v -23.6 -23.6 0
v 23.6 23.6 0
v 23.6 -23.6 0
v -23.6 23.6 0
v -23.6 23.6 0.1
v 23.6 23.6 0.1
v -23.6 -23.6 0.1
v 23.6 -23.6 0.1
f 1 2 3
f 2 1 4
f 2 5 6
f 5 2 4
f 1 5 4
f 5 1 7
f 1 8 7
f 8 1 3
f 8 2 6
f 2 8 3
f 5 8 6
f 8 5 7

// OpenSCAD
// file: ../p/box5-12.scad
use <../lib.scad>
function ldraw_lib__box5_12() = [
// 0 Box with 5 Faces without Any Edges
// 0 Name: box5-12.dat
// 0 Author: Chris Dee [cwdee]
// 0 !LDRAW_ORG Primitive UPDATE 2009-02
// 0 !LICENSE Licensed under CC BY 4.0 : see CAreadme.txt
// 
// 0 BFC CERTIFY CCW
  [0,"BFC","CERTIFY"],
  [0,"BFC","CCW"],
// 
// 0 !HISTORY 2009-09-03 [PTadmin] Official Update 2009-02
// 
// 
// 4 16 1 1 1 1 1 -1 -1 1 -1 -1 1 1
  [4,16,1,1,1,1,1,-1,-1,1,-1,-1,1,1],
// 4 16 -1 0 1 1 0 1 1 1 1 -1 1 1
  [4,16,-1,0,1,1,0,1,1,1,1,-1,1,1],
// 4 16 -1 0 -1 -1 0 1 -1 1 1 -1 1 -1
  [4,16,-1,0,-1,-1,0,1,-1,1,1,-1,1,-1],
// 4 16 1 0 -1 -1 0 -1 -1 1 -1 1 1 -1
  [4,16,1,0,-1,-1,0,-1,-1,1,-1,1,1,-1],
// 4 16 1 0 1 1 0 -1 1 1 -1 1 1 1
  [4,16,1,0,1,1,0,-1,1,1,-1,1,1,1],
// 0
];
module ldraw_lib__box5_12(step=0, col=false, unit=2/5, alt=false, line=0.2, solid=!$preview)
    makepoly(ldraw_lib__box5_12(), step=step, col=col, unit=unit, alt=alt, line=line, solid=solid);
ldraw_lib__box5_12(line=0.2);
// main file
use <../lib.scad>
use <../p/box5-12.scad>
function ldraw_lib__6018358a() = [
// 0 Sticker  5.9 x  5.9 with Chrome Silver Mirror
// 0 Name: 6018358a.dat
// 0 Author: Takeshi Takahashi [RainbowDolphin]
// 0 !LDRAW_ORG Part UPDATE 2024-05
// 0 !LICENSE Licensed under CC BY 4.0 : see CAreadme.txt
// 
// 0 BFC CERTIFY CCW
  [0,"BFC","CERTIFY"],
  [0,"BFC","CCW"],
// 
// 0 !KEYWORDS Practice, Rehearsal, Set 41004, Stage
// 
// 0 !HISTORY 2024-06-30 [OrionP] Official Update 2024-05
// 
// 
// 1 16 0 -0.25 0 59 0 0 0 0.25 0 0 0 59 box5-12.dat
  [1,16,0,-0.25,0,59,0,0,0,0.25,0,0,0,59, ldraw_lib__box5_12()],
// 
// 4 383 59 -0.25 59 -59 -0.25 59 -59 -0.25 -59 59 -0.25 -59
  [4,383,59,-0.25,59,-59,-0.25,59,-59,-0.25,-59,59,-0.25,-59],
];
module ldraw_lib__6018358a(step=0, col=false, unit=2/5, alt=false, line=0.2, solid=!$preview)
    makepoly(ldraw_lib__6018358a(), step=step, col=col, unit=unit, alt=alt, line=line, solid=solid);
ldraw_lib__6018358a(line=0.2);
